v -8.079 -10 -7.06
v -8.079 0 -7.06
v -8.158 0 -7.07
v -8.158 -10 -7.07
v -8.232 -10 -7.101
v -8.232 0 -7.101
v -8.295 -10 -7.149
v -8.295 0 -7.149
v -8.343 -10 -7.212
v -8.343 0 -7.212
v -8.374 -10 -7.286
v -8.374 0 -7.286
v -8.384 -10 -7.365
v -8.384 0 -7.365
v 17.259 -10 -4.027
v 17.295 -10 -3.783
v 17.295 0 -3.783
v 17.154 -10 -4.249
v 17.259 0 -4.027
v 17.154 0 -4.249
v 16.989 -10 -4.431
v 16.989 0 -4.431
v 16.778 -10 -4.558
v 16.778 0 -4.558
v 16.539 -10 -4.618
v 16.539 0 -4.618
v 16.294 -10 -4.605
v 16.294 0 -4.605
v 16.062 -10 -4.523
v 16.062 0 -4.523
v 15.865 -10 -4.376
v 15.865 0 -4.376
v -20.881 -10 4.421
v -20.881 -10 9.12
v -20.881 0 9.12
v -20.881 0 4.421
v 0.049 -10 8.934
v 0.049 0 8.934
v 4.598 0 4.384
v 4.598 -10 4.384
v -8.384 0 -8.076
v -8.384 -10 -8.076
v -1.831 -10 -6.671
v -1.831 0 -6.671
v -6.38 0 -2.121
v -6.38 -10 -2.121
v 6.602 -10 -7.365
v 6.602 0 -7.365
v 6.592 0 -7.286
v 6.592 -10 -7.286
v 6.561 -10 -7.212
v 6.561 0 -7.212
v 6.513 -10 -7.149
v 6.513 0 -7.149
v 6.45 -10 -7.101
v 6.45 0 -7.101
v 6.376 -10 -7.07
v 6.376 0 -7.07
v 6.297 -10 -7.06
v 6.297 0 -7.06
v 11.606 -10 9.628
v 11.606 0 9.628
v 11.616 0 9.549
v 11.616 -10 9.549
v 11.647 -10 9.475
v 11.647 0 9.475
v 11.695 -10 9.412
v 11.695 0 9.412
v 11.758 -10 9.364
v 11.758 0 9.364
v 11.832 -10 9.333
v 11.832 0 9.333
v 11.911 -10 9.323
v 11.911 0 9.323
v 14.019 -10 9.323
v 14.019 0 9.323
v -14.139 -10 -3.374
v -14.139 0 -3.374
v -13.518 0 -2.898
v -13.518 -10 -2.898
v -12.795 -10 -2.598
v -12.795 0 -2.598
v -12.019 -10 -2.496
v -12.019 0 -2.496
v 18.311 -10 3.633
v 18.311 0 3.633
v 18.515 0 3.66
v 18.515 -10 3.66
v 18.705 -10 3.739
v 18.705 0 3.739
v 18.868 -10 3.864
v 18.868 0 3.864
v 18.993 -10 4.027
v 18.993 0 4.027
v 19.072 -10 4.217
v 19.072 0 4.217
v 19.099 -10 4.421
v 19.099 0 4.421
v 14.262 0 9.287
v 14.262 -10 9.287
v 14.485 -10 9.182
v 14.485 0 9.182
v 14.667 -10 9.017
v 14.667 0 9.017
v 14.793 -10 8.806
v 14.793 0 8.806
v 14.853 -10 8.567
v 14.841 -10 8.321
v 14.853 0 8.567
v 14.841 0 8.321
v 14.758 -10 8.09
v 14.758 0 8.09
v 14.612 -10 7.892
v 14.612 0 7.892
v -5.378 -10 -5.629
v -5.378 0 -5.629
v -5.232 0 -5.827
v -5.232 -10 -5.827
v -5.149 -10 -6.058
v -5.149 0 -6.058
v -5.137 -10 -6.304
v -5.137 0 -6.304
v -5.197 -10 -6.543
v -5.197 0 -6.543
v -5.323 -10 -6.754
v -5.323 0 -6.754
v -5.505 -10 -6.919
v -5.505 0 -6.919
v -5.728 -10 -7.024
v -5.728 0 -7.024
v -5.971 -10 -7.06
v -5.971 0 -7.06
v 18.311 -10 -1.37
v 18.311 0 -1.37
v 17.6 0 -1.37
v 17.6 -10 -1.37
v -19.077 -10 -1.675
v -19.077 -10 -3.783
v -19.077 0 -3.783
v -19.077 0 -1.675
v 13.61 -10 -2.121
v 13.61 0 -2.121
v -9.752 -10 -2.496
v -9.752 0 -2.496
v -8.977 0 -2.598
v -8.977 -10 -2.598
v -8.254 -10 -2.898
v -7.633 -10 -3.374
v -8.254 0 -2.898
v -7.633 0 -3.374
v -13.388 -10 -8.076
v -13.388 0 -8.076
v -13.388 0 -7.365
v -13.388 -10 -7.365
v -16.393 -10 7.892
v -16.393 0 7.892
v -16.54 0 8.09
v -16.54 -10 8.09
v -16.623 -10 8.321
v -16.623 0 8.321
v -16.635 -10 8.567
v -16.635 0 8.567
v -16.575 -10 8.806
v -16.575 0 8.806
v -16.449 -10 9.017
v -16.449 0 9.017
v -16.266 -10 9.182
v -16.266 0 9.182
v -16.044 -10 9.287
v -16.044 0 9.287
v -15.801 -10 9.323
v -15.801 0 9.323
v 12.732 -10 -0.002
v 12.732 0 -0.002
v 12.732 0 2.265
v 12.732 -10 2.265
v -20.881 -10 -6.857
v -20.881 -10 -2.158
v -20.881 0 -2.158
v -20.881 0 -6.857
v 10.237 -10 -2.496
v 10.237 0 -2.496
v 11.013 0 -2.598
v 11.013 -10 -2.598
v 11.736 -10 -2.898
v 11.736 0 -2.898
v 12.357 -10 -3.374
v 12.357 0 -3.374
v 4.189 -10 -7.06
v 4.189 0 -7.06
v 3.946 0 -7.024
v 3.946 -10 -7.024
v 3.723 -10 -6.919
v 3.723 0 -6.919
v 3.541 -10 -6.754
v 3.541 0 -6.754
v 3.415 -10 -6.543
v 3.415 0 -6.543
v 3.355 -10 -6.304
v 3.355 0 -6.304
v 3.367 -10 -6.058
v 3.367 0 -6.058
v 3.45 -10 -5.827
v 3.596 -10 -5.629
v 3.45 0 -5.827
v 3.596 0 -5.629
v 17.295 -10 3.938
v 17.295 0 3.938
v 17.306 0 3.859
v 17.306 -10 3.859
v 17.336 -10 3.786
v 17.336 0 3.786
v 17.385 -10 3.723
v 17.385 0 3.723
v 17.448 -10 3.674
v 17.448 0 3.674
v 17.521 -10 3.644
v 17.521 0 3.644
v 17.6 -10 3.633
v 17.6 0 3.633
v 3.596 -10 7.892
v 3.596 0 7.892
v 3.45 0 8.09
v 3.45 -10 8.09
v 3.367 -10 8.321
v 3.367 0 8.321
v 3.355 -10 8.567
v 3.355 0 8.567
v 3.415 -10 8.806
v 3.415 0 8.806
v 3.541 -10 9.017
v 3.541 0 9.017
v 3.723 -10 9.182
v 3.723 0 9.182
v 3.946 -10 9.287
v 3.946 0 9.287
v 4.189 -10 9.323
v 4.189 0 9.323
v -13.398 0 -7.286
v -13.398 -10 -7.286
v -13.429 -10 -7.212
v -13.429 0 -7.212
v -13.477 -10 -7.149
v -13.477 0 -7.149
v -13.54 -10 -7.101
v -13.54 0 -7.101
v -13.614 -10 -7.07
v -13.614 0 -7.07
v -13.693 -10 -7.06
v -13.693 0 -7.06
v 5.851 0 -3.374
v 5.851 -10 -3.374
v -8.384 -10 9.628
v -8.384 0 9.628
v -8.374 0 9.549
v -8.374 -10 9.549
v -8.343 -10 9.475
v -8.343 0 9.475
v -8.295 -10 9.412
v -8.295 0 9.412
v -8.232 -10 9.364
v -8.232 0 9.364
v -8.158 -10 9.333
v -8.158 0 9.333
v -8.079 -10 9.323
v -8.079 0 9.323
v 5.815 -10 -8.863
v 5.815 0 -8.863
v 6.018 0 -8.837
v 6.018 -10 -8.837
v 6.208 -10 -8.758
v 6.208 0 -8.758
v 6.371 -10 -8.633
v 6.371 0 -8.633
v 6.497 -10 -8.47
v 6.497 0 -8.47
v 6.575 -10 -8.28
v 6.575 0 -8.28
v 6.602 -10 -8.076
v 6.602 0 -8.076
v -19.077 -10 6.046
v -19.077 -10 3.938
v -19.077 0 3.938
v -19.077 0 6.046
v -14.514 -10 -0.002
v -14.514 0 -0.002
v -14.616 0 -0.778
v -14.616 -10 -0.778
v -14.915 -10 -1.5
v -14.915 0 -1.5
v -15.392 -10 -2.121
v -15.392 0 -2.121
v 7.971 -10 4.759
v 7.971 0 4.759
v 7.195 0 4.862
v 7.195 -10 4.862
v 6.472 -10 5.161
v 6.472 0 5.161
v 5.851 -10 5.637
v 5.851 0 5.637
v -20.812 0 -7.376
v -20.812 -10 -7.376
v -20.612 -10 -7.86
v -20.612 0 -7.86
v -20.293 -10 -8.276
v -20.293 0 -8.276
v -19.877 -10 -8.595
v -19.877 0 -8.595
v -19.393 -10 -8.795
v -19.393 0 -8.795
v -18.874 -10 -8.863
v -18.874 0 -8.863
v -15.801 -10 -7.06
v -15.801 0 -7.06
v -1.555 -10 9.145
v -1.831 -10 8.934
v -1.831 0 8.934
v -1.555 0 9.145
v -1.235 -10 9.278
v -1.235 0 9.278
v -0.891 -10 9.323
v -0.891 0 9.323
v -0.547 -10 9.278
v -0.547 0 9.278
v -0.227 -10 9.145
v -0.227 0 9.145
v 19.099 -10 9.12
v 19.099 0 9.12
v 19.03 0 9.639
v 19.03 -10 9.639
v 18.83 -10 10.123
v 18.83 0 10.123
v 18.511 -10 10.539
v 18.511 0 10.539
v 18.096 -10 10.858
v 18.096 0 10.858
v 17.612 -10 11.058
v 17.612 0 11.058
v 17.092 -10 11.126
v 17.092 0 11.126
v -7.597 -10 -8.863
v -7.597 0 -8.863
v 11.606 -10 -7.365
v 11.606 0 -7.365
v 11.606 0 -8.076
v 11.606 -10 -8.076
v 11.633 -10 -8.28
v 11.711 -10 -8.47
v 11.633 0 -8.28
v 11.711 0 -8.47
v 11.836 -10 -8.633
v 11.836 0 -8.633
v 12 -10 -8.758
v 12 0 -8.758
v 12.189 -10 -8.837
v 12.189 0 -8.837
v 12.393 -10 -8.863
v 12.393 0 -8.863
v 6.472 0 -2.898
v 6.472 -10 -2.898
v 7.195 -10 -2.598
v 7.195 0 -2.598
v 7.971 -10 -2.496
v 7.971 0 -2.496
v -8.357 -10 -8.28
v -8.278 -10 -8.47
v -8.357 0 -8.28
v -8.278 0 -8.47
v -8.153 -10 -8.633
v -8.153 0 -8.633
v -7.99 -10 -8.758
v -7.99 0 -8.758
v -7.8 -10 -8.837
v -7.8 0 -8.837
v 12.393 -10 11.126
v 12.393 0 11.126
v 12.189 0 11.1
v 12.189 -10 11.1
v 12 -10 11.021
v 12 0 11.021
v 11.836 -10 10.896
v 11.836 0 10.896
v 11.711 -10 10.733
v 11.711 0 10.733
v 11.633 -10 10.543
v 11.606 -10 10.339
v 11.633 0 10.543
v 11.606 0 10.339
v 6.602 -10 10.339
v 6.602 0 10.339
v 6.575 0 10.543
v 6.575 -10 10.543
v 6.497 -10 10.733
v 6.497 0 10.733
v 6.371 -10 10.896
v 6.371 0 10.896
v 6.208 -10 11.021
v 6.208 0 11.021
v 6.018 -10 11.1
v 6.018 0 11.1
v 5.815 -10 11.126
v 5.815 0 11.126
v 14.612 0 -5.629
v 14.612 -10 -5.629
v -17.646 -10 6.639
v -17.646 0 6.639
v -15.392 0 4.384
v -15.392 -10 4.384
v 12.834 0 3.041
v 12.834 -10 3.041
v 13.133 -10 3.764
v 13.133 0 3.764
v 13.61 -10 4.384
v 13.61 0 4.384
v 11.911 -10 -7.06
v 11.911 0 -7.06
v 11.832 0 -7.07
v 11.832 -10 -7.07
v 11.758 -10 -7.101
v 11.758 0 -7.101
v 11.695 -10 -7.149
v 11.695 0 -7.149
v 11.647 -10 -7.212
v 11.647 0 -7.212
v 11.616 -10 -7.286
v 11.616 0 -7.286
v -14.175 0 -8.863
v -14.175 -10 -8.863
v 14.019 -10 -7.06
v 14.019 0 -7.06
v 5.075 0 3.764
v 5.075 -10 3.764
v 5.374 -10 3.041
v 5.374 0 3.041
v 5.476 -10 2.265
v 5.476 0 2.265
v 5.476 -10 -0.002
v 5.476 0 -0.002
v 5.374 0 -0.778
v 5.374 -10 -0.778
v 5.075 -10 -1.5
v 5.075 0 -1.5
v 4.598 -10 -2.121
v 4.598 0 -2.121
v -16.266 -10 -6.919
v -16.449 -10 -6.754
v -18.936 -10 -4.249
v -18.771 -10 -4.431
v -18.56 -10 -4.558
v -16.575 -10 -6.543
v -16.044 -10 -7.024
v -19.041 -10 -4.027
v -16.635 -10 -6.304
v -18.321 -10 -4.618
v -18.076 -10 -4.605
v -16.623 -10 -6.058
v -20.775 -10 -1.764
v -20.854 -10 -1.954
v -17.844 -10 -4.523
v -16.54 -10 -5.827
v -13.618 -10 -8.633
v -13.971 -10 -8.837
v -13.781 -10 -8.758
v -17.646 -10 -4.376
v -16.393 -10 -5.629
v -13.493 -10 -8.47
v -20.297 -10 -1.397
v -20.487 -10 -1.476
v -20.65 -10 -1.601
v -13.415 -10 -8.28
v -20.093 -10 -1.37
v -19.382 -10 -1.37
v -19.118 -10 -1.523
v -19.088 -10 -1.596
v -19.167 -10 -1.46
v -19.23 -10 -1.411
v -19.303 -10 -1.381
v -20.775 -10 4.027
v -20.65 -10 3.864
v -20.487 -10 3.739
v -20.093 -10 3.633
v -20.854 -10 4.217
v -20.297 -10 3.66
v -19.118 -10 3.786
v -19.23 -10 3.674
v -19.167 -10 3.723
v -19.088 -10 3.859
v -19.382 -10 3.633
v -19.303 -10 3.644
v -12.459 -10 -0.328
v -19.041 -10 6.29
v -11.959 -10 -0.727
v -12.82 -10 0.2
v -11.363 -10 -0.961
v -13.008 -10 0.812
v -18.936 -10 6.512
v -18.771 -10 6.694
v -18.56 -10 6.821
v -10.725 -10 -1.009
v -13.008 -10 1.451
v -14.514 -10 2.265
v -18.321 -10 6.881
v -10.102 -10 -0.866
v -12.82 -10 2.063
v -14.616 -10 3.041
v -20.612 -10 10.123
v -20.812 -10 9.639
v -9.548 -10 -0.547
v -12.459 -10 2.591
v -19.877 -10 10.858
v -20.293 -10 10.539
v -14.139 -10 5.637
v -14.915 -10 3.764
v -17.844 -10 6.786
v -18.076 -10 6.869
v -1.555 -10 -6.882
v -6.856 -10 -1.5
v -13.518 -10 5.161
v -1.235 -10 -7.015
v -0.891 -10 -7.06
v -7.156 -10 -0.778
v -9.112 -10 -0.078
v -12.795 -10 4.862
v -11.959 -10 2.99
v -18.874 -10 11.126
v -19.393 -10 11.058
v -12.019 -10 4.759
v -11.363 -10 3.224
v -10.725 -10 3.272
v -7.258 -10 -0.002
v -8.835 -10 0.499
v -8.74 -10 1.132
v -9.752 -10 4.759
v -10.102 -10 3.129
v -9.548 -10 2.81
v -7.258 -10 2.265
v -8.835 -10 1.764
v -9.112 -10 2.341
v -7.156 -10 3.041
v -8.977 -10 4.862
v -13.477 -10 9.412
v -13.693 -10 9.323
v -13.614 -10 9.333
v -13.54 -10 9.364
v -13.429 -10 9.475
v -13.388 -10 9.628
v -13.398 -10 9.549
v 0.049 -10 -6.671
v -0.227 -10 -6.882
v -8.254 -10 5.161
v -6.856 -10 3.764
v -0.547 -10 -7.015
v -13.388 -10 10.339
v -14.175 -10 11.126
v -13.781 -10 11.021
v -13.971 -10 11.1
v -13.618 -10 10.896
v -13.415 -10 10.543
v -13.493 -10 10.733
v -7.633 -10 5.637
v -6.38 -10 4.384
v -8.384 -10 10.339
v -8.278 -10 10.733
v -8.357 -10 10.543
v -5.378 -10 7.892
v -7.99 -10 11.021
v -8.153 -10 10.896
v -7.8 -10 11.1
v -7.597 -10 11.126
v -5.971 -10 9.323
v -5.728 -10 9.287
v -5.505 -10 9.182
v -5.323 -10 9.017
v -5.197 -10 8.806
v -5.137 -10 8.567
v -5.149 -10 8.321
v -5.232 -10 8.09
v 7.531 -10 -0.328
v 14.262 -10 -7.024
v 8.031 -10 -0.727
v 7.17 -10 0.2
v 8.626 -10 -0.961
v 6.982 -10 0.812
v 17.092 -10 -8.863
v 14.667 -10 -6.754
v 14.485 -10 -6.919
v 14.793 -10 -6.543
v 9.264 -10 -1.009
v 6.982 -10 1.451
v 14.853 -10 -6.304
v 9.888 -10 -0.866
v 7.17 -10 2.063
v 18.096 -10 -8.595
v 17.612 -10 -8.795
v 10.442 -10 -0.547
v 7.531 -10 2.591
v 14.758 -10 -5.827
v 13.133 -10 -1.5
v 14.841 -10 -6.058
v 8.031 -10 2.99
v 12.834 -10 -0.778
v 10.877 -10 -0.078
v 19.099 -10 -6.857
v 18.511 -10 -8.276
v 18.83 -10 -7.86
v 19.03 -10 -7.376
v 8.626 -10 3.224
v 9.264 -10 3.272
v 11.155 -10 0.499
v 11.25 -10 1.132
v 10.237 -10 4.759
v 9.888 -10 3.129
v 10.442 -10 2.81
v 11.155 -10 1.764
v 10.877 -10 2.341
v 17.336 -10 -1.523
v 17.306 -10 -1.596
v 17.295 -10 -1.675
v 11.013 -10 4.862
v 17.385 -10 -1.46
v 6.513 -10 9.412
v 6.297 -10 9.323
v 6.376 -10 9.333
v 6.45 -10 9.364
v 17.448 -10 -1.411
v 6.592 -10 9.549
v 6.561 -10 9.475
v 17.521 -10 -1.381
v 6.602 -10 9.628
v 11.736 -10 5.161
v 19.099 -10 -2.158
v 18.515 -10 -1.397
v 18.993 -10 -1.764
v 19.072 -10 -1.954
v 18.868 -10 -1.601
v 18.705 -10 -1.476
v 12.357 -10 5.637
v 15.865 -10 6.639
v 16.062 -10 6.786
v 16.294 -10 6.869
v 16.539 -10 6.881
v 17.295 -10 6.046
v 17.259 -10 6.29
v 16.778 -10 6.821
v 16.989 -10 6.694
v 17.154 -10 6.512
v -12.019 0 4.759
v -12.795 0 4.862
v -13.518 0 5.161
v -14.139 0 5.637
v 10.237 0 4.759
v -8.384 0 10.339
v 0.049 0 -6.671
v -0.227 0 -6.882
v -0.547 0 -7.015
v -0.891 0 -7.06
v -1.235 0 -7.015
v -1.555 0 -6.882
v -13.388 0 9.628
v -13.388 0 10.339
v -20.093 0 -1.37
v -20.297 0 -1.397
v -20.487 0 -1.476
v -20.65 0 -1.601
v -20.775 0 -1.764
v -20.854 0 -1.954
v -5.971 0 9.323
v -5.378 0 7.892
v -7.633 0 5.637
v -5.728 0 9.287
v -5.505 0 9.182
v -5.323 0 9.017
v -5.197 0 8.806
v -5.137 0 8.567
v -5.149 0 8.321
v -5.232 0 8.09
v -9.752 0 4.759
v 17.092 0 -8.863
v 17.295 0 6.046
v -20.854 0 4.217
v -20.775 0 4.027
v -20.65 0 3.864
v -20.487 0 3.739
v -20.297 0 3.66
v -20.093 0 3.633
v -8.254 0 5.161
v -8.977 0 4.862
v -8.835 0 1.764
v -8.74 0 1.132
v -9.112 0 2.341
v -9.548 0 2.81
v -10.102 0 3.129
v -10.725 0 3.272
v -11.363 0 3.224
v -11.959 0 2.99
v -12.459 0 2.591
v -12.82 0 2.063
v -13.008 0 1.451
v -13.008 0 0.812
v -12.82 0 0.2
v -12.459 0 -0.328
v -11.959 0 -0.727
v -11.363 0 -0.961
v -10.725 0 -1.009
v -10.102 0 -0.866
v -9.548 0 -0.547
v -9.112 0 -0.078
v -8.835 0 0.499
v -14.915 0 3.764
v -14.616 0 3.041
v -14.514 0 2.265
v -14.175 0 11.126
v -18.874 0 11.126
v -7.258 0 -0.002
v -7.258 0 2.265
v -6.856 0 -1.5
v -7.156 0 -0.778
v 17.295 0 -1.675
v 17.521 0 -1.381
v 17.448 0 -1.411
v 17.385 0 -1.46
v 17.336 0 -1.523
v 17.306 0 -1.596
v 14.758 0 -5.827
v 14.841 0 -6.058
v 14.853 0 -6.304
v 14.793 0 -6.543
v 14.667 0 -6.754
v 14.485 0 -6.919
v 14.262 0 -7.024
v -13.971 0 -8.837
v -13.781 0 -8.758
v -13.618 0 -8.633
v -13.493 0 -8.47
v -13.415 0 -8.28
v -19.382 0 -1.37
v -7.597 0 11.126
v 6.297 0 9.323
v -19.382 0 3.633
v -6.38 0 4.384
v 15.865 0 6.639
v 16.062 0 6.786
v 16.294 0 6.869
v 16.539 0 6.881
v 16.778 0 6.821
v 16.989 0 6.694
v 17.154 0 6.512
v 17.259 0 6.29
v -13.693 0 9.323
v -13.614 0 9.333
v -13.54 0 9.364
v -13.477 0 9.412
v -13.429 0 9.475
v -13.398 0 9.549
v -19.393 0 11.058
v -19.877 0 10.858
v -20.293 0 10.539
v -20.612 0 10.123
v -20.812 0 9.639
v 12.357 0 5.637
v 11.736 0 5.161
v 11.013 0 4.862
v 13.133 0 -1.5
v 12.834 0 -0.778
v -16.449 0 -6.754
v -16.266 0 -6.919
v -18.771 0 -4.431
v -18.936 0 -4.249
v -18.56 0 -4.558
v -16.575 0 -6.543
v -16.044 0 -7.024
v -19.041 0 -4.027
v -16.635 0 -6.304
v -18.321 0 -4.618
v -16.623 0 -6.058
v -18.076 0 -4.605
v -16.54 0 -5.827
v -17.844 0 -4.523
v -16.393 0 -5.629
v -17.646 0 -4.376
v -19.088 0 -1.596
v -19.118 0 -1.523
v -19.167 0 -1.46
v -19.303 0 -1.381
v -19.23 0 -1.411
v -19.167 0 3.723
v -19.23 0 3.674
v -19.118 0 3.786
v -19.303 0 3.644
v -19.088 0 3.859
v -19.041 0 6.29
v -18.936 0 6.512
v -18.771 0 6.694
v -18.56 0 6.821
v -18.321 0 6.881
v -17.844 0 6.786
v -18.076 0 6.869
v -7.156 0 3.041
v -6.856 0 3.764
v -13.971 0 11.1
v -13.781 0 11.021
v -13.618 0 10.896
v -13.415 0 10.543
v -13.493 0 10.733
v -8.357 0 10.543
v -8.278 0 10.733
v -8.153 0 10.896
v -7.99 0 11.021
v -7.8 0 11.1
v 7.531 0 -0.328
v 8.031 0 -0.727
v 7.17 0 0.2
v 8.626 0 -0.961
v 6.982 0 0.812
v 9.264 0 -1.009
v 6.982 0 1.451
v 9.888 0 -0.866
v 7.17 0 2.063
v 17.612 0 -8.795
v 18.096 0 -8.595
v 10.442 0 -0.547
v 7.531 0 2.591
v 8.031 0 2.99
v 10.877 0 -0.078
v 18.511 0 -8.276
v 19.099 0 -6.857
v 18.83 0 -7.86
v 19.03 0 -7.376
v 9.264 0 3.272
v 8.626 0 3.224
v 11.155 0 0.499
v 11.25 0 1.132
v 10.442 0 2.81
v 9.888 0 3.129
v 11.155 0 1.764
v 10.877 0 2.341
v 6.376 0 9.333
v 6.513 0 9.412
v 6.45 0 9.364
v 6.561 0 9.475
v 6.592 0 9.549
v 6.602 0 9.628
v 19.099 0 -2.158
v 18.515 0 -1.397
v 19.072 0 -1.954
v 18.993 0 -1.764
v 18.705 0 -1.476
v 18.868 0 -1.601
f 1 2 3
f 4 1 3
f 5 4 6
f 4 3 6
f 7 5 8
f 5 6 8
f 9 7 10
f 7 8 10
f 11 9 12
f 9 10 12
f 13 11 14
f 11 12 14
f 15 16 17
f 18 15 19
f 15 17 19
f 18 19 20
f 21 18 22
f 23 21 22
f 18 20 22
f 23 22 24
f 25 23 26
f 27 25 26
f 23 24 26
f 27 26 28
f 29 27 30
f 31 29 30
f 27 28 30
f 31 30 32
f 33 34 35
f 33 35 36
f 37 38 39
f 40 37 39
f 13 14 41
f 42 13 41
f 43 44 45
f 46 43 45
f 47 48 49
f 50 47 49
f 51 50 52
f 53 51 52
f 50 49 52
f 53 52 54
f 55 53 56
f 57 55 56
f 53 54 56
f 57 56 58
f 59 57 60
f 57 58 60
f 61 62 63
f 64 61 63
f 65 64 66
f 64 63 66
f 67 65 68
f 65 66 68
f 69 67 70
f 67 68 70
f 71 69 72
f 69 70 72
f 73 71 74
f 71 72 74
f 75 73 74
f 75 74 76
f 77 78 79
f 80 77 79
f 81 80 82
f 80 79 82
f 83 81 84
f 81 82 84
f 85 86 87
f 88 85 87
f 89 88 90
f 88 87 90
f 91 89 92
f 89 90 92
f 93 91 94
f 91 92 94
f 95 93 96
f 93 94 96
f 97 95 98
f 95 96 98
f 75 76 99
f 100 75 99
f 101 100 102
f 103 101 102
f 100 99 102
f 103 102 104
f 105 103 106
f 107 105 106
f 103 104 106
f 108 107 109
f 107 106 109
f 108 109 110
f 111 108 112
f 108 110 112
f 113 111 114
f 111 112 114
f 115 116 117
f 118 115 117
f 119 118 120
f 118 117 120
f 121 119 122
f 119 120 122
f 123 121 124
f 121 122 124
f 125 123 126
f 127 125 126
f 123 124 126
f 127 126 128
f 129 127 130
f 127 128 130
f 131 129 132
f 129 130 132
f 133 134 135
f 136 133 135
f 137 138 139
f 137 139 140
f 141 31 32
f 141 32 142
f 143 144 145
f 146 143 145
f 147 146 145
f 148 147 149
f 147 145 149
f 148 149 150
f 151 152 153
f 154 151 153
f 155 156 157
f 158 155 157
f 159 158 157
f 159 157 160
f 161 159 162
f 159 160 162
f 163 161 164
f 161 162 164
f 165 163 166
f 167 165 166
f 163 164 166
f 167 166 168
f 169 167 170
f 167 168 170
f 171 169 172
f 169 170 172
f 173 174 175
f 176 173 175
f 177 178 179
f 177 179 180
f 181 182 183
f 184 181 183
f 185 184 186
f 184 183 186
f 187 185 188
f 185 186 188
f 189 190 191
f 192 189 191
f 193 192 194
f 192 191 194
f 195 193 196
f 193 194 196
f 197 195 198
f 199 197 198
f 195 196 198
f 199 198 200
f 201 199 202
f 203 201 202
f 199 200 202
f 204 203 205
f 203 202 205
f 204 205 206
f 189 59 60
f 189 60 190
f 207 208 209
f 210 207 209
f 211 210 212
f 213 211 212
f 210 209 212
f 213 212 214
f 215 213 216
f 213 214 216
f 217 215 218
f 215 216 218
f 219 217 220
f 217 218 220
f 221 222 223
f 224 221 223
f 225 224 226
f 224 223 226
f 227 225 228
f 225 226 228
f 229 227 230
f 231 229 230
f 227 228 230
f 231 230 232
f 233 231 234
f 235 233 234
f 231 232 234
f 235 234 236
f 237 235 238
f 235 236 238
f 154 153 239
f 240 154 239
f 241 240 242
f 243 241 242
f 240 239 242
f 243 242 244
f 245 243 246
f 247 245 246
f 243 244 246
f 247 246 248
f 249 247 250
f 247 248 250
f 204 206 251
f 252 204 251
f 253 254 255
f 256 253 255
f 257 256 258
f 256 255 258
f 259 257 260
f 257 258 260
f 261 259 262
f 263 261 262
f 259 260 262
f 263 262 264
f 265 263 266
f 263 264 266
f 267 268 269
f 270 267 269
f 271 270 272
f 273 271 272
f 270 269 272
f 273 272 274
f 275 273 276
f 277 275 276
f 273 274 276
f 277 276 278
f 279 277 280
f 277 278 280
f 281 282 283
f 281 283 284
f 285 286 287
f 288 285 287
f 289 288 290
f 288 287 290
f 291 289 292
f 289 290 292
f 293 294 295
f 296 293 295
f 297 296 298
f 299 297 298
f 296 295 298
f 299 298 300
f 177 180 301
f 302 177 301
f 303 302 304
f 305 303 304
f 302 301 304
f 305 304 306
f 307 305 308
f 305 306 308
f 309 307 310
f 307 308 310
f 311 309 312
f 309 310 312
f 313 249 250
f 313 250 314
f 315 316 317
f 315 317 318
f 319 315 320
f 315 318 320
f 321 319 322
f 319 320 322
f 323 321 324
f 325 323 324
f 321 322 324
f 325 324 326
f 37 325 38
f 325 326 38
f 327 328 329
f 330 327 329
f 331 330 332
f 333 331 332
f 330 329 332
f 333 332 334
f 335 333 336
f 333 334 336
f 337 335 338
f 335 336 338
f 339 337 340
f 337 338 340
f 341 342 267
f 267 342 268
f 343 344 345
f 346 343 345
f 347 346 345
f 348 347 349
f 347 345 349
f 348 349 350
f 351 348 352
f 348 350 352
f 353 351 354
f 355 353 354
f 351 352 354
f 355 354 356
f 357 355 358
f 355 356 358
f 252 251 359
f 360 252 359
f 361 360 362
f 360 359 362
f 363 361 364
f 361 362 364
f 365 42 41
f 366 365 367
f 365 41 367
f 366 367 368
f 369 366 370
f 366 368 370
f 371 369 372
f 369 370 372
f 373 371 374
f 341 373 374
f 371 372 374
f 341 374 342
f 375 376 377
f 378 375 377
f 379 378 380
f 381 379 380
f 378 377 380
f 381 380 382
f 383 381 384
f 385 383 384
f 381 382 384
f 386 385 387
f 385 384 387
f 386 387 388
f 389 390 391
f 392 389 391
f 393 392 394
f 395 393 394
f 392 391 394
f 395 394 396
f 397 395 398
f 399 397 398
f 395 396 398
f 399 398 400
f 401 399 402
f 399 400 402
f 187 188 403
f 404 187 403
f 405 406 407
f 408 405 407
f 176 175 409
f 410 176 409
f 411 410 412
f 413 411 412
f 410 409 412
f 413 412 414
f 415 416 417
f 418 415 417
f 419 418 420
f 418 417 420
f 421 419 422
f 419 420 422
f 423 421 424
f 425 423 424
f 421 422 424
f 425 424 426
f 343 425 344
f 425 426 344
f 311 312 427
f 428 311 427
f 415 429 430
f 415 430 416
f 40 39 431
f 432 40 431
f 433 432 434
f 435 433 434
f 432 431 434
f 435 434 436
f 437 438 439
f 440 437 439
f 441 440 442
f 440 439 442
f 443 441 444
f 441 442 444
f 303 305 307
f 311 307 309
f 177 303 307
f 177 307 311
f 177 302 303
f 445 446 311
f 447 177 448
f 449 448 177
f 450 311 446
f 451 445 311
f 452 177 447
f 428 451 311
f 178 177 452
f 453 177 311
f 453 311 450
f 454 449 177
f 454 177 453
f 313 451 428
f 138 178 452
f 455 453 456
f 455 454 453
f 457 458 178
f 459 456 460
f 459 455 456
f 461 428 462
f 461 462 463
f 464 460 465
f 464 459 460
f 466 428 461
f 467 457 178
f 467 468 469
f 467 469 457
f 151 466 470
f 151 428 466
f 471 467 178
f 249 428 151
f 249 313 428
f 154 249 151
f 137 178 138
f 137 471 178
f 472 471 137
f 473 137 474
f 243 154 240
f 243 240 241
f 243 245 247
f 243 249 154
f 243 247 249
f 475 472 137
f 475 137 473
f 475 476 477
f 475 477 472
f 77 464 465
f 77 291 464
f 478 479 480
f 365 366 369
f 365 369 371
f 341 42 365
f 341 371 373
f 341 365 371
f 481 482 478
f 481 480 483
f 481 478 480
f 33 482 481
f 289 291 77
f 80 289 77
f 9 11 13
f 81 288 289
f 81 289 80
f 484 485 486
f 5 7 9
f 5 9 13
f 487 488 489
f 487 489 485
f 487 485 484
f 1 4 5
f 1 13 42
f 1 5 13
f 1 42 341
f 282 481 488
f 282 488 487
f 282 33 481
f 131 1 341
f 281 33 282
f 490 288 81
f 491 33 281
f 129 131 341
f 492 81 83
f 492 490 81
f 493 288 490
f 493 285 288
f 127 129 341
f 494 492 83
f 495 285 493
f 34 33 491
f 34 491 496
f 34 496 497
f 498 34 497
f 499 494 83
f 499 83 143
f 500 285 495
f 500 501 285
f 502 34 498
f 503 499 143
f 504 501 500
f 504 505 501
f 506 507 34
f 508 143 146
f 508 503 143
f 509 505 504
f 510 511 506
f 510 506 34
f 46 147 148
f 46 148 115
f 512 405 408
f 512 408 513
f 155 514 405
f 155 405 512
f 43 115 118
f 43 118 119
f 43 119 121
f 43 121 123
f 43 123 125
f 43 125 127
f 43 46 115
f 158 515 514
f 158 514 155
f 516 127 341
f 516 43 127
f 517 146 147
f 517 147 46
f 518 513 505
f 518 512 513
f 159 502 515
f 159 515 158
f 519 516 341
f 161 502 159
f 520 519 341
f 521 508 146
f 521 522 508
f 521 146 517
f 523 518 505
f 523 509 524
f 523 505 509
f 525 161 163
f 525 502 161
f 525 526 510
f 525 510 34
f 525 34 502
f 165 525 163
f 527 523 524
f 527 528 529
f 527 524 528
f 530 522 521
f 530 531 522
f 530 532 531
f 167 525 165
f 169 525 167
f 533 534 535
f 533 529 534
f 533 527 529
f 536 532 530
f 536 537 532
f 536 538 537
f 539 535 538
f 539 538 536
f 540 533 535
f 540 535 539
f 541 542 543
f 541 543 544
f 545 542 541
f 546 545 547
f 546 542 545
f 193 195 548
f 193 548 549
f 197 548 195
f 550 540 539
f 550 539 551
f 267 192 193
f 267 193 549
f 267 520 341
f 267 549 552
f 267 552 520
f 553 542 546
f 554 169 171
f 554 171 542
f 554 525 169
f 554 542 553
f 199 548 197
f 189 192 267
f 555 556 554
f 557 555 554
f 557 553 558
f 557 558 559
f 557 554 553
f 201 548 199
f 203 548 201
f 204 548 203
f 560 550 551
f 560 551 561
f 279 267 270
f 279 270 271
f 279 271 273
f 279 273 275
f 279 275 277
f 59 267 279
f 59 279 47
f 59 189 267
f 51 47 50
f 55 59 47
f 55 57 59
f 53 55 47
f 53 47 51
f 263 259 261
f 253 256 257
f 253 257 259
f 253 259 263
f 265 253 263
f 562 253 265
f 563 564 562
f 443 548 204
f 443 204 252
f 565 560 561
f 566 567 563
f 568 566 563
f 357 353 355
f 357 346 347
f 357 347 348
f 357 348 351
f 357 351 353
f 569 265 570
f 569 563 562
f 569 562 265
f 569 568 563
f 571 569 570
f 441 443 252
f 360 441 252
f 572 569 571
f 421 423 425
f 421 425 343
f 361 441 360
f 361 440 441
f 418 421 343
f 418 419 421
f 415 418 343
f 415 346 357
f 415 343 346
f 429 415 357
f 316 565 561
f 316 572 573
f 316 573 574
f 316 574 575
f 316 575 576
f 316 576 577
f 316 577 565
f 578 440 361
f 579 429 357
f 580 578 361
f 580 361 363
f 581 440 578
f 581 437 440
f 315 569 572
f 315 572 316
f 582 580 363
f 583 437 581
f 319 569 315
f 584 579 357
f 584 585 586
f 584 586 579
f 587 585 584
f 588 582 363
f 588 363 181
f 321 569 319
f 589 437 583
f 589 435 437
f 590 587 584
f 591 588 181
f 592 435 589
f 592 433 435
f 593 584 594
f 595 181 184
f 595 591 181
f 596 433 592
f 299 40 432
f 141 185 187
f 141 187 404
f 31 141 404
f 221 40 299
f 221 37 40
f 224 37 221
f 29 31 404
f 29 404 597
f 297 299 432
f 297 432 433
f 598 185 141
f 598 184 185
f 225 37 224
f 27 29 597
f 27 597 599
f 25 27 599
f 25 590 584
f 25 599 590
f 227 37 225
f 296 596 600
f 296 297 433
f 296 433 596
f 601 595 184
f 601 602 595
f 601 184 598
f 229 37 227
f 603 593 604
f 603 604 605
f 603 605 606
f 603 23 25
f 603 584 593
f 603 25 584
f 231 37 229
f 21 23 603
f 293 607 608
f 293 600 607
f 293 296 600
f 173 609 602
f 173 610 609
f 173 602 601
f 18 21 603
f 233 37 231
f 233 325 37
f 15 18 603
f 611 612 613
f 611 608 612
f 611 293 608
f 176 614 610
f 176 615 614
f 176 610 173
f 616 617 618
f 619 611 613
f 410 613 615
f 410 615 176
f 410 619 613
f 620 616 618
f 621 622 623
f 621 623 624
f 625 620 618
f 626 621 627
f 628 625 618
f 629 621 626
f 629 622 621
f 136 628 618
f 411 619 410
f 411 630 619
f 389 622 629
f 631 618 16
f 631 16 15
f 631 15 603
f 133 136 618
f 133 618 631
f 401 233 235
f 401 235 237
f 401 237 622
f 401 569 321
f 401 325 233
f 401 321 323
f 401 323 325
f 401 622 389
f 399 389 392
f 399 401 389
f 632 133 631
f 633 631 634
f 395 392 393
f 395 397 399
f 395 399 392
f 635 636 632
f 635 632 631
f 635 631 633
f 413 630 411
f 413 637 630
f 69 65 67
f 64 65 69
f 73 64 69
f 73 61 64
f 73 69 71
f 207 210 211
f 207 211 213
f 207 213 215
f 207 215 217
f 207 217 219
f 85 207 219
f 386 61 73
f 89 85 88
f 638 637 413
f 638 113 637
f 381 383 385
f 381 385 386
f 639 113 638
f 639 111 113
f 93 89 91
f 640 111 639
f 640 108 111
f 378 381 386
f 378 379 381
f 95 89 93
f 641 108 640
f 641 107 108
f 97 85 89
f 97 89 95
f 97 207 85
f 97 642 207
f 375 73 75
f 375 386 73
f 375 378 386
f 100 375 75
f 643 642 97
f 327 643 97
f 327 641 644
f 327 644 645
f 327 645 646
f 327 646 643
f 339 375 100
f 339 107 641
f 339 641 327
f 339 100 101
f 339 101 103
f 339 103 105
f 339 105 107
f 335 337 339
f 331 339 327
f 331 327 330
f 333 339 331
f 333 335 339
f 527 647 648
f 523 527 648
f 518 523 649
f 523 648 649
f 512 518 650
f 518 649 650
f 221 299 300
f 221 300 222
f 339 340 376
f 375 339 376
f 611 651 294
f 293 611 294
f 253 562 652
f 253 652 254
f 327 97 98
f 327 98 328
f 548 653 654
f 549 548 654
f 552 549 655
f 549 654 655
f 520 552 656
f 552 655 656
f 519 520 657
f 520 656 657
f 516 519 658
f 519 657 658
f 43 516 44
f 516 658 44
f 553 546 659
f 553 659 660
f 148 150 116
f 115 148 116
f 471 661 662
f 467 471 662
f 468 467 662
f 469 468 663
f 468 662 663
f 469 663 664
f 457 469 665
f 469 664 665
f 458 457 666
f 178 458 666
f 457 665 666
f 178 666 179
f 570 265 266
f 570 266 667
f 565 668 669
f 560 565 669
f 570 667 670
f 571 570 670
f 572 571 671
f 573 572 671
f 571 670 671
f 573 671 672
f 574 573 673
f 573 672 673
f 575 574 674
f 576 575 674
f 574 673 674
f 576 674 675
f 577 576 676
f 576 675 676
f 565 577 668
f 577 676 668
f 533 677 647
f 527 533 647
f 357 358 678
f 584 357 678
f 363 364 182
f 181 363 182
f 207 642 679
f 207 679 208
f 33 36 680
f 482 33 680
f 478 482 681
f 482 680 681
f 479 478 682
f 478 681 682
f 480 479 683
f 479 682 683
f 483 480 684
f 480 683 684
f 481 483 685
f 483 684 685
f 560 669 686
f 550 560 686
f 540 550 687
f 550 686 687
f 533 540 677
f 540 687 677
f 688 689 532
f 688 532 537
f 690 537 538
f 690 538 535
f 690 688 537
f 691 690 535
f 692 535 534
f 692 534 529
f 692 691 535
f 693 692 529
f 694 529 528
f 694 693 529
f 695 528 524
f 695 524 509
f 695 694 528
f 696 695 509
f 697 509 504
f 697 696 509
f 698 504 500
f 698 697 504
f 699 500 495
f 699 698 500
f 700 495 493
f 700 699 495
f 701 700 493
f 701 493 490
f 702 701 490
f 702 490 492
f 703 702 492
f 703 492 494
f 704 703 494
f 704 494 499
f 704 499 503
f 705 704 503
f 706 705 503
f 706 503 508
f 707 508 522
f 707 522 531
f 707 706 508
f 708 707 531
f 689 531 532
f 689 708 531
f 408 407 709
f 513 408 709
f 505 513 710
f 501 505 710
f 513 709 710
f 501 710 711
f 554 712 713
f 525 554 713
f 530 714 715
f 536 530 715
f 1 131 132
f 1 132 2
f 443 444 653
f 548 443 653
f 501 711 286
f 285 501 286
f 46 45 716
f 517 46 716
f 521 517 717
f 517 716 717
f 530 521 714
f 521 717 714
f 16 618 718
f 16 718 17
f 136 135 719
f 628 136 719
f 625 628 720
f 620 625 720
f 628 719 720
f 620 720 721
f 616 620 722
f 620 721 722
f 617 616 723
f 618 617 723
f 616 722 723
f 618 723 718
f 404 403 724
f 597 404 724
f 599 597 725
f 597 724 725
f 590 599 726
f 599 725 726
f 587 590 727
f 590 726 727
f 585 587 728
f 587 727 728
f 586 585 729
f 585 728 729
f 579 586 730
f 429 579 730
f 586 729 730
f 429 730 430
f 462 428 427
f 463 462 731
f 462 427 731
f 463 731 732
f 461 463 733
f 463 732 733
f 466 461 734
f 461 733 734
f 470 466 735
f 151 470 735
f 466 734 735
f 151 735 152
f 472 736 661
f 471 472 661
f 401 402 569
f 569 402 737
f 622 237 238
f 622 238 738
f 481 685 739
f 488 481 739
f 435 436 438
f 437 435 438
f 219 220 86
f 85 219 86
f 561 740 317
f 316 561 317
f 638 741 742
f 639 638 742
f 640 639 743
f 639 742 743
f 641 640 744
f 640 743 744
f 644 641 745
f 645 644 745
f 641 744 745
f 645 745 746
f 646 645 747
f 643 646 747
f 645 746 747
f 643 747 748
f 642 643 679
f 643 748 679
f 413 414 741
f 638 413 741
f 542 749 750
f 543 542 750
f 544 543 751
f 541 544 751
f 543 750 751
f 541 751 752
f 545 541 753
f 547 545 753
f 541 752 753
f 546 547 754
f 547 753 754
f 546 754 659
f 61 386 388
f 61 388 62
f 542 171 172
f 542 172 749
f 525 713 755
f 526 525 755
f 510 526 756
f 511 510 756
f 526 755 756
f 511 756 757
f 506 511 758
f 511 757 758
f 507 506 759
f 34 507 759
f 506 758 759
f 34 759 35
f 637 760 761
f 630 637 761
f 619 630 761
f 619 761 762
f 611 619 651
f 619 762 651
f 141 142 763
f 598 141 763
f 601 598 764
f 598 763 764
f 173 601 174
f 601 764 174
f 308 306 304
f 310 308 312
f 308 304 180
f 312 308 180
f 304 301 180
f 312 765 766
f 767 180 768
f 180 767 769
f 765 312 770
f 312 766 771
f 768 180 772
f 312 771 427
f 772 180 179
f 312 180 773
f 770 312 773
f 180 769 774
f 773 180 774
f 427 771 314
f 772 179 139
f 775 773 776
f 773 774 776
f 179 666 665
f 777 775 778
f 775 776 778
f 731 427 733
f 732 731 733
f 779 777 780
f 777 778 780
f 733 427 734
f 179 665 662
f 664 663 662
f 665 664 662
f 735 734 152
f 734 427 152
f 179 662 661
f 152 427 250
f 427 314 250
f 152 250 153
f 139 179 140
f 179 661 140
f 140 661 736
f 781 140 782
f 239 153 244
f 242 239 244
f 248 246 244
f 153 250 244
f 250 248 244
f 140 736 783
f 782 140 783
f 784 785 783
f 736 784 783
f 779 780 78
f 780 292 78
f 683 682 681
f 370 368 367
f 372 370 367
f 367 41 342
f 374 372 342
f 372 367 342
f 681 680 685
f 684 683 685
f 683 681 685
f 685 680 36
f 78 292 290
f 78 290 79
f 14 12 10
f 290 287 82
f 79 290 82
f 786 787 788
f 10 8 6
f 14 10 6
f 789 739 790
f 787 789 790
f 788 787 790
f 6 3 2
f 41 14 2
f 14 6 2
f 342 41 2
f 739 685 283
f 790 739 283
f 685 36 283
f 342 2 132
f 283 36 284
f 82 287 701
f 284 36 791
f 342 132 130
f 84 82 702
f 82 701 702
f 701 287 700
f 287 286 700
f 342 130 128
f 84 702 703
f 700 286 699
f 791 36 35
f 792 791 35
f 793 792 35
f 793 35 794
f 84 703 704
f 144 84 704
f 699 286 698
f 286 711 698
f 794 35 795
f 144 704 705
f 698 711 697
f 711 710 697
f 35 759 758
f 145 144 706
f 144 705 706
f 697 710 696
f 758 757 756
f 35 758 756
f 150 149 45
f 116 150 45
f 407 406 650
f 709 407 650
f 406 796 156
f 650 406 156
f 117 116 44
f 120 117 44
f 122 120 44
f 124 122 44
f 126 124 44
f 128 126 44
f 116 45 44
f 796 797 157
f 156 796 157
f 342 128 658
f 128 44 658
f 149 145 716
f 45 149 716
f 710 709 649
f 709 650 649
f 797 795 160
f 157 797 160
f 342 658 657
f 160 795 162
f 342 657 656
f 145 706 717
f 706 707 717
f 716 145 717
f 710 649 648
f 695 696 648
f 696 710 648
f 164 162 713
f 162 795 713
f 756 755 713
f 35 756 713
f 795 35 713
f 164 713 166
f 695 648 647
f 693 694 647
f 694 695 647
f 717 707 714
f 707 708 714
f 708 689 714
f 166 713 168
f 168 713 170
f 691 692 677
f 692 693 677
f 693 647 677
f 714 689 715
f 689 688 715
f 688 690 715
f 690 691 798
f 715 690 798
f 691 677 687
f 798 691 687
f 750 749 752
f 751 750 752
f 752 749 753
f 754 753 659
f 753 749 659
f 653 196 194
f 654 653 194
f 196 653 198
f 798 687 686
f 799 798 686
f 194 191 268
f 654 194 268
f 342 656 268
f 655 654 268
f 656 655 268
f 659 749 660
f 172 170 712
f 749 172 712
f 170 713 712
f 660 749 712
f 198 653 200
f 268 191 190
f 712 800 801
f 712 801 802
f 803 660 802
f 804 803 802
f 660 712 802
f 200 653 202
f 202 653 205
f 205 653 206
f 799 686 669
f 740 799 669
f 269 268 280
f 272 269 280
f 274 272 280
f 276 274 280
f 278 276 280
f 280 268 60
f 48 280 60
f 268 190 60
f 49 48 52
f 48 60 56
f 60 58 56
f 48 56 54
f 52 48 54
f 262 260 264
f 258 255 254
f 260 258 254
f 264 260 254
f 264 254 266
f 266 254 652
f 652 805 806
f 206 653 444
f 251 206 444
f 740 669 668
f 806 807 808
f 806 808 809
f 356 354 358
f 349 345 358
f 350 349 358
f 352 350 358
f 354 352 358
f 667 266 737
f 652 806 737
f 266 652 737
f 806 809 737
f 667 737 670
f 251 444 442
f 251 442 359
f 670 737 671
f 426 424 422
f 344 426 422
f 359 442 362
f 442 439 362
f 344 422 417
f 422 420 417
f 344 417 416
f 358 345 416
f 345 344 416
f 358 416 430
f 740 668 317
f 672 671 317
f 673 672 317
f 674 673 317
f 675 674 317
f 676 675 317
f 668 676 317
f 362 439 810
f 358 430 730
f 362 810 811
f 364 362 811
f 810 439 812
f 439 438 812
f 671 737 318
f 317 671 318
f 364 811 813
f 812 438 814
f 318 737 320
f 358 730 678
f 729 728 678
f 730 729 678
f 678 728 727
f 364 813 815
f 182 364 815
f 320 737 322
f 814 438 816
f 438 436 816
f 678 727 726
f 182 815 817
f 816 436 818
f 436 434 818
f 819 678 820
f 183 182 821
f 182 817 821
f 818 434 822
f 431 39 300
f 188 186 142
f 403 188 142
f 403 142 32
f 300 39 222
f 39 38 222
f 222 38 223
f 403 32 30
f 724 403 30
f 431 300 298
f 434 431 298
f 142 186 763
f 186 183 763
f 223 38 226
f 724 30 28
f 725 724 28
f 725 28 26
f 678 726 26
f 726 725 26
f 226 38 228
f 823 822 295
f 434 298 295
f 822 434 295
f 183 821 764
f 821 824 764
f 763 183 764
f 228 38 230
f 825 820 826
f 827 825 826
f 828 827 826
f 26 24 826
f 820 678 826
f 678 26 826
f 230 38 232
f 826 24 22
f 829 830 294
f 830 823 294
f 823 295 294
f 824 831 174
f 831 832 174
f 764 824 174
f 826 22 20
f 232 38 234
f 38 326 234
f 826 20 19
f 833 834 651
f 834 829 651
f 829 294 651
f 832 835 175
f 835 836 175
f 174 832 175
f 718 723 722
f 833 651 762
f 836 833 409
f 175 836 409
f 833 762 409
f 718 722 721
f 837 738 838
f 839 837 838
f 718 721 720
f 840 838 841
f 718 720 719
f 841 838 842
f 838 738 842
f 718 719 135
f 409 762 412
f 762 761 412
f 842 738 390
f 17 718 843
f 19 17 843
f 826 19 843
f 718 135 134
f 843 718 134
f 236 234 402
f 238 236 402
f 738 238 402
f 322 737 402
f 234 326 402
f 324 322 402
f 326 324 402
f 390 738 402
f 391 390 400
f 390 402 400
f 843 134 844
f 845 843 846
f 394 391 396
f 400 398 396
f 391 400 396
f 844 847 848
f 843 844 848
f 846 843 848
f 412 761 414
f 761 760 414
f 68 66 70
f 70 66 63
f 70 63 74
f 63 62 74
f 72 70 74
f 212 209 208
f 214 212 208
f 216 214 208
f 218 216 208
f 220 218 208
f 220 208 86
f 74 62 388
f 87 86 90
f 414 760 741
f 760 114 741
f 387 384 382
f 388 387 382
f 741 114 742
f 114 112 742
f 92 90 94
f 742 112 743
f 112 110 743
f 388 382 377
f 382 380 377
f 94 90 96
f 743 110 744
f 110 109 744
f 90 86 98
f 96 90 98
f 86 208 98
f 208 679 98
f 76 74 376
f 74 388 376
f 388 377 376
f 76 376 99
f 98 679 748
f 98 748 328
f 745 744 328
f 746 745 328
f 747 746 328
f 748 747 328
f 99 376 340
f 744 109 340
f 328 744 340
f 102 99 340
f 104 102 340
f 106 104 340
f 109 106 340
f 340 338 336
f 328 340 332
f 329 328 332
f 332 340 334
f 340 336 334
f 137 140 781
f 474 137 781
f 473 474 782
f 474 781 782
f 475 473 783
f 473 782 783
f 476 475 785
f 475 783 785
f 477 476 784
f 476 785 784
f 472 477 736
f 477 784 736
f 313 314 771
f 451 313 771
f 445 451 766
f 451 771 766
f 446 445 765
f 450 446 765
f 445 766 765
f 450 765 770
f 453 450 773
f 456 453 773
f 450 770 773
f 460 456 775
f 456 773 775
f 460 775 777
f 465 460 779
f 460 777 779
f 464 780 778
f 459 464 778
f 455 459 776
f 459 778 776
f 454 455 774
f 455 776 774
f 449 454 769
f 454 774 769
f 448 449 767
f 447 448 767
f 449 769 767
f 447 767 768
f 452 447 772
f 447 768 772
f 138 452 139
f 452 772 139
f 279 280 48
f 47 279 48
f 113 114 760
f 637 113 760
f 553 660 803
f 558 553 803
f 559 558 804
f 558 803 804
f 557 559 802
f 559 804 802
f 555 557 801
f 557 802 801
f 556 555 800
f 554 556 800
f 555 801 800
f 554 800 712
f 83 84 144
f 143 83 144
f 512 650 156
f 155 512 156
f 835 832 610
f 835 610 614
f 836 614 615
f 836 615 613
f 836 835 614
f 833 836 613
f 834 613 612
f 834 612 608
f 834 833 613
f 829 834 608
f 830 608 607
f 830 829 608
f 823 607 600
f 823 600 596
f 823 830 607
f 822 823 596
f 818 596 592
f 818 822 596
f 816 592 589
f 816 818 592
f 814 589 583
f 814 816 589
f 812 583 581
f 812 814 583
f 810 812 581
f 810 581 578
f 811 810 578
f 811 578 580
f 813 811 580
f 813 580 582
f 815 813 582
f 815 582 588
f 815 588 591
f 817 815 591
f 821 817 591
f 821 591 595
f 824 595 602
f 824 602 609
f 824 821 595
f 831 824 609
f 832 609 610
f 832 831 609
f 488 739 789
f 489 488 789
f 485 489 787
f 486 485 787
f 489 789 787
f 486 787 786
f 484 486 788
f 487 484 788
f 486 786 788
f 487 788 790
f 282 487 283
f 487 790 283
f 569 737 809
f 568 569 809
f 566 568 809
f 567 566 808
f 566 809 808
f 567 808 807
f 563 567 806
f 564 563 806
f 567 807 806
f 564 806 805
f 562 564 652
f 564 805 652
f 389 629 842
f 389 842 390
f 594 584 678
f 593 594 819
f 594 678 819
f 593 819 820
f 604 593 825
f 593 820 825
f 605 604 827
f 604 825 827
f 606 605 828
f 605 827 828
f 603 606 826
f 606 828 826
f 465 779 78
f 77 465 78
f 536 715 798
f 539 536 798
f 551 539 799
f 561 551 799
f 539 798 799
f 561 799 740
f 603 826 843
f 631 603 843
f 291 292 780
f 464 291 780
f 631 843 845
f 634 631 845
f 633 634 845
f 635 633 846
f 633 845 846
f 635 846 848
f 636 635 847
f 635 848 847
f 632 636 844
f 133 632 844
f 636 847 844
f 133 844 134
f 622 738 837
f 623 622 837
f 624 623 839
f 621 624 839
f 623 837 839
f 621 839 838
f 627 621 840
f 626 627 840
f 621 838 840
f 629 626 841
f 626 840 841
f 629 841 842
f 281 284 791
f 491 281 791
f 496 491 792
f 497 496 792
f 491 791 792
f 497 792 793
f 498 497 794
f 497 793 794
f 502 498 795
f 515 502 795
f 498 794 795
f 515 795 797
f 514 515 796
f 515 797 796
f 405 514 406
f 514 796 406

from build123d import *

# Parameters (mm, degrees)
F0_R     = 2.1463
F1_DEPTH = 10


with BuildPart() as f1:
    # F0 (on Front) → F1 (new body)
    with BuildSketch(Plane.XZ):
        with BuildLine():
            Line((-9.75241, 4.759444), (-12.019248, 4.759444))
            ThreePointArc((-12.019248, 4.759444), (-13.166227, 4.987592), (-14.138589, 5.637303))
            Line((-14.138589, 5.637303), (-16.393426, 7.892141))
            ThreePointArc((-16.393426, 7.892141), (-16.575125, 8.805603), (-15.800729, 9.323038))
            Line((-15.800729, 9.323038), (-13.692529, 9.323038))
            ThreePointArc((-13.692529, 9.323038), (-13.477003, 9.412312), (-13.387729, 9.627838))
            Line((-13.387729, 9.627838), (-13.387729, 10.339038))
            ThreePointArc((-13.387729, 10.339038), (-13.618353, 10.895814), (-14.175129, 11.126438))
            Line((-14.175129, 11.126438), (-18.874129, 11.126438))
            ThreePointArc((-18.874129, 11.126438), (-20.29301, 10.538718), (-20.880729, 9.119838))
            Line((-20.880729, 9.119838), (-20.880729, 4.420838))
            ThreePointArc((-20.880729, 4.420838), (-20.650105, 3.864062), (-20.093329, 3.633438))
            Line((-20.093329, 3.633438), (-19.382129, 3.633438))
            ThreePointArc((-19.382129, 3.633438), (-19.166603, 3.722712), (-19.077329, 3.938238))
            Line((-19.077329, 3.938238), (-19.077329, 6.046438))
            ThreePointArc((-19.077329, 6.046438), (-18.559895, 6.820834), (-17.646432, 6.639135))
            Line((-17.646432, 6.639135), (-15.391595, 4.384297))
            ThreePointArc((-15.391595, 4.384297), (-14.741884, 3.411936), (-14.513736, 2.264957))
            Line((-14.513736, 2.264957), (-14.513736, -0.001881))
            ThreePointArc((-14.513736, -0.001881), (-14.741884, -1.14886), (-15.391595, -2.121222))
            Line((-15.391595, -2.121222), (-17.646432, -4.376059))
            ThreePointArc((-17.646432, -4.376059), (-18.559895, -4.557758), (-19.077329, -3.783362))
            Line((-19.077329, -3.783362), (-19.077329, -1.675162))
            ThreePointArc((-19.077329, -1.675162), (-19.166603, -1.459636), (-19.382129, -1.370362))
            Line((-19.382129, -1.370362), (-20.093329, -1.370362))
            ThreePointArc((-20.093329, -1.370362), (-20.650105, -1.600986), (-20.880729, -2.157762))
            Line((-20.880729, -2.157762), (-20.880729, -6.856762))
            ThreePointArc((-20.880729, -6.856762), (-20.29301, -8.275643), (-18.874129, -8.863362))
            Line((-18.874129, -8.863362), (-14.175129, -8.863362))
            ThreePointArc((-14.175129, -8.863362), (-13.618353, -8.632738), (-13.387729, -8.075962))
            Line((-13.387729, -8.075962), (-13.387729, -7.364762))
            ThreePointArc((-13.387729, -7.364762), (-13.477003, -7.149236), (-13.692529, -7.059962))
            Line((-13.692529, -7.059962), (-15.800729, -7.059962))
            ThreePointArc((-15.800729, -7.059962), (-16.575125, -6.542528), (-16.393426, -5.629065))
            Line((-16.393426, -5.629065), (-14.138589, -3.374228))
            ThreePointArc((-14.138589, -3.374228), (-13.166227, -2.724517), (-12.019248, -2.496368))
            Line((-12.019248, -2.496368), (-9.75241, -2.496368))
            ThreePointArc((-9.75241, -2.496368), (-8.605431, -2.724517), (-7.63307, -3.374228))
            Line((-7.63307, -3.374228), (-5.378232, -5.629065))
            ThreePointArc((-5.378232, -5.629065), (-5.196534, -6.542528), (-5.970929, -7.059962))
            Line((-5.970929, -7.059962), (-8.079129, -7.059962))
            ThreePointArc((-8.079129, -7.059962), (-8.294656, -7.149236), (-8.383929, -7.364762))
            Line((-8.383929, -7.364762), (-8.383929, -8.075962))
            ThreePointArc((-8.383929, -8.075962), (-8.153305, -8.632738), (-7.596529, -8.863362))
            Line((-7.596529, -8.863362), (5.814671, -8.863362))
            ThreePointArc((5.814671, -8.863362), (6.371447, -8.632738), (6.602071, -8.075962))
            Line((6.602071, -8.075962), (6.602071, -7.364762))
            ThreePointArc((6.602071, -7.364762), (6.512797, -7.149236), (6.297271, -7.059962))
            Line((6.297271, -7.059962), (4.189071, -7.059962))
            ThreePointArc((4.189071, -7.059962), (3.414675, -6.542528), (3.596374, -5.629065))
            Line((3.596374, -5.629065), (5.851211, -3.374228))
            ThreePointArc((5.851211, -3.374228), (6.823573, -2.724517), (7.970552, -2.496368))
            Line((7.970552, -2.496368), (10.23739, -2.496368))
            ThreePointArc((10.23739, -2.496368), (11.384369, -2.724517), (12.35673, -3.374228))
            Line((12.35673, -3.374228), (14.611568, -5.629065))
            ThreePointArc((14.611568, -5.629065), (14.793266, -6.542528), (14.018871, -7.059962))
            Line((14.018871, -7.059962), (11.910671, -7.059962))
            ThreePointArc((11.910671, -7.059962), (11.695144, -7.149236), (11.605871, -7.364762))
            Line((11.605871, -7.364762), (11.605871, -8.075962))
            ThreePointArc((11.605871, -8.075962), (11.836495, -8.632738), (12.393271, -8.863362))
            Line((12.393271, -8.863362), (17.092271, -8.863362))
            ThreePointArc((17.092271, -8.863362), (18.511151, -8.275643), (19.098871, -6.856762))
            Line((19.098871, -6.856762), (19.098871, -2.157762))
            ThreePointArc((19.098871, -2.157762), (18.868247, -1.600986), (18.311471, -1.370362))
            Line((18.311471, -1.370362), (17.600271, -1.370362))
            ThreePointArc((17.600271, -1.370362), (17.384744, -1.459636), (17.295471, -1.675162))
            Line((17.295471, -1.675162), (17.295471, -3.783362))
            ThreePointArc((17.295471, -3.783362), (16.778036, -4.557758), (15.864574, -4.376059))
            Line((15.864574, -4.376059), (13.609736, -2.121222))
            ThreePointArc((13.609736, -2.121222), (12.960025, -1.14886), (12.731877, -0.001881))
            Line((12.731877, -0.001881), (12.731877, 2.264957))
            ThreePointArc((12.731877, 2.264957), (12.960025, 3.411936), (13.609736, 4.384297))
            Line((13.609736, 4.384297), (15.864574, 6.639135))
            ThreePointArc((15.864574, 6.639135), (16.778036, 6.820834), (17.295471, 6.046438))
            Line((17.295471, 6.046438), (17.295471, 3.938238))
            ThreePointArc((17.295471, 3.938238), (17.384744, 3.722712), (17.600271, 3.633438))
            Line((17.600271, 3.633438), (18.311471, 3.633438))
            ThreePointArc((18.311471, 3.633438), (18.868247, 3.864062), (19.098871, 4.420838))
            Line((19.098871, 4.420838), (19.098871, 9.119838))
            ThreePointArc((19.098871, 9.119838), (18.511151, 10.538718), (17.092271, 11.126438))
            Line((17.092271, 11.126438), (12.393271, 11.126438))
            ThreePointArc((12.393271, 11.126438), (11.836495, 10.895814), (11.605871, 10.339038))
            Line((11.605871, 10.339038), (11.605871, 9.627838))
            ThreePointArc((11.605871, 9.627838), (11.695144, 9.412312), (11.910671, 9.323038))
            Line((11.910671, 9.323038), (14.018871, 9.323038))
            ThreePointArc((14.018871, 9.323038), (14.793266, 8.805603), (14.611568, 7.892141))
            Line((14.611568, 7.892141), (12.35673, 5.637303))
            ThreePointArc((12.35673, 5.637303), (11.384369, 4.987592), (10.23739, 4.759444))
            Line((10.23739, 4.759444), (7.970552, 4.759444))
            ThreePointArc((7.970552, 4.759444), (6.823573, 4.987592), (5.851211, 5.637303))
            Line((5.851211, 5.637303), (3.596374, 7.892141))
            ThreePointArc((3.596374, 7.892141), (3.414675, 8.805603), (4.189071, 9.323038))
            Line((4.189071, 9.323038), (6.297271, 9.323038))
            ThreePointArc((6.297271, 9.323038), (6.512797, 9.412312), (6.602071, 9.627838))
            Line((6.602071, 9.627838), (6.602071, 10.339038))
            ThreePointArc((6.602071, 10.339038), (6.371447, 10.895814), (5.814671, 11.126438))
            Line((5.814671, 11.126438), (-7.596529, 11.126438))
            ThreePointArc((-7.596529, 11.126438), (-8.153305, 10.895814), (-8.383929, 10.339038))
            Line((-8.383929, 10.339038), (-8.383929, 9.627838))
            ThreePointArc((-8.383929, 9.627838), (-8.294656, 9.412312), (-8.079129, 9.323038))
            Line((-8.079129, 9.323038), (-5.970929, 9.323038))
            ThreePointArc((-5.970929, 9.323038), (-5.196534, 8.805603), (-5.378232, 7.892141))
            Line((-5.378232, 7.892141), (-7.63307, 5.637303))
            ThreePointArc((-7.63307, 5.637303), (-8.605431, 4.987592), (-9.75241, 4.759444))
        make_face()
        with Locations((-10.885829, 1.131538)):
            Circle(F0_R, mode=Mode.SUBTRACT)
        with BuildLine():
            Line((-7.257923, -0.001881), (-7.257923, 2.264957))
            ThreePointArc((-7.257923, 2.264957), (-7.029775, 3.411936), (-6.380064, 4.384297))
            Line((-6.380064, 4.384297), (-1.83051, 8.933851))
            ThreePointArc((-1.83051, 8.933851), (-0.890929, 9.323038), (0.048652, 8.933851))
            Line((0.048652, 8.933851), (4.598205, 4.384297))
            ThreePointArc((4.598205, 4.384297), (5.247916, 3.411936), (5.476064, 2.264957))
            Line((5.476064, 2.264957), (5.476064, -0.001881))
            ThreePointArc((5.476064, -0.001881), (5.247916, -1.14886), (4.598205, -2.121222))
            Line((4.598205, -2.121222), (0.048652, -6.670775))
            ThreePointArc((0.048652, -6.670775), (-0.890929, -7.059962), (-1.83051, -6.670775))
            Line((-1.83051, -6.670775), (-6.380064, -2.121222))
            ThreePointArc((-6.380064, -2.121222), (-7.029775, -1.14886), (-7.257923, -0.001881))
        make_face(mode=Mode.SUBTRACT)
        with Locations((9.103971, 1.131538)):
            Circle(F0_R, mode=Mode.SUBTRACT)
    extrude(amount=F1_DEPTH)


solid = f1.part
